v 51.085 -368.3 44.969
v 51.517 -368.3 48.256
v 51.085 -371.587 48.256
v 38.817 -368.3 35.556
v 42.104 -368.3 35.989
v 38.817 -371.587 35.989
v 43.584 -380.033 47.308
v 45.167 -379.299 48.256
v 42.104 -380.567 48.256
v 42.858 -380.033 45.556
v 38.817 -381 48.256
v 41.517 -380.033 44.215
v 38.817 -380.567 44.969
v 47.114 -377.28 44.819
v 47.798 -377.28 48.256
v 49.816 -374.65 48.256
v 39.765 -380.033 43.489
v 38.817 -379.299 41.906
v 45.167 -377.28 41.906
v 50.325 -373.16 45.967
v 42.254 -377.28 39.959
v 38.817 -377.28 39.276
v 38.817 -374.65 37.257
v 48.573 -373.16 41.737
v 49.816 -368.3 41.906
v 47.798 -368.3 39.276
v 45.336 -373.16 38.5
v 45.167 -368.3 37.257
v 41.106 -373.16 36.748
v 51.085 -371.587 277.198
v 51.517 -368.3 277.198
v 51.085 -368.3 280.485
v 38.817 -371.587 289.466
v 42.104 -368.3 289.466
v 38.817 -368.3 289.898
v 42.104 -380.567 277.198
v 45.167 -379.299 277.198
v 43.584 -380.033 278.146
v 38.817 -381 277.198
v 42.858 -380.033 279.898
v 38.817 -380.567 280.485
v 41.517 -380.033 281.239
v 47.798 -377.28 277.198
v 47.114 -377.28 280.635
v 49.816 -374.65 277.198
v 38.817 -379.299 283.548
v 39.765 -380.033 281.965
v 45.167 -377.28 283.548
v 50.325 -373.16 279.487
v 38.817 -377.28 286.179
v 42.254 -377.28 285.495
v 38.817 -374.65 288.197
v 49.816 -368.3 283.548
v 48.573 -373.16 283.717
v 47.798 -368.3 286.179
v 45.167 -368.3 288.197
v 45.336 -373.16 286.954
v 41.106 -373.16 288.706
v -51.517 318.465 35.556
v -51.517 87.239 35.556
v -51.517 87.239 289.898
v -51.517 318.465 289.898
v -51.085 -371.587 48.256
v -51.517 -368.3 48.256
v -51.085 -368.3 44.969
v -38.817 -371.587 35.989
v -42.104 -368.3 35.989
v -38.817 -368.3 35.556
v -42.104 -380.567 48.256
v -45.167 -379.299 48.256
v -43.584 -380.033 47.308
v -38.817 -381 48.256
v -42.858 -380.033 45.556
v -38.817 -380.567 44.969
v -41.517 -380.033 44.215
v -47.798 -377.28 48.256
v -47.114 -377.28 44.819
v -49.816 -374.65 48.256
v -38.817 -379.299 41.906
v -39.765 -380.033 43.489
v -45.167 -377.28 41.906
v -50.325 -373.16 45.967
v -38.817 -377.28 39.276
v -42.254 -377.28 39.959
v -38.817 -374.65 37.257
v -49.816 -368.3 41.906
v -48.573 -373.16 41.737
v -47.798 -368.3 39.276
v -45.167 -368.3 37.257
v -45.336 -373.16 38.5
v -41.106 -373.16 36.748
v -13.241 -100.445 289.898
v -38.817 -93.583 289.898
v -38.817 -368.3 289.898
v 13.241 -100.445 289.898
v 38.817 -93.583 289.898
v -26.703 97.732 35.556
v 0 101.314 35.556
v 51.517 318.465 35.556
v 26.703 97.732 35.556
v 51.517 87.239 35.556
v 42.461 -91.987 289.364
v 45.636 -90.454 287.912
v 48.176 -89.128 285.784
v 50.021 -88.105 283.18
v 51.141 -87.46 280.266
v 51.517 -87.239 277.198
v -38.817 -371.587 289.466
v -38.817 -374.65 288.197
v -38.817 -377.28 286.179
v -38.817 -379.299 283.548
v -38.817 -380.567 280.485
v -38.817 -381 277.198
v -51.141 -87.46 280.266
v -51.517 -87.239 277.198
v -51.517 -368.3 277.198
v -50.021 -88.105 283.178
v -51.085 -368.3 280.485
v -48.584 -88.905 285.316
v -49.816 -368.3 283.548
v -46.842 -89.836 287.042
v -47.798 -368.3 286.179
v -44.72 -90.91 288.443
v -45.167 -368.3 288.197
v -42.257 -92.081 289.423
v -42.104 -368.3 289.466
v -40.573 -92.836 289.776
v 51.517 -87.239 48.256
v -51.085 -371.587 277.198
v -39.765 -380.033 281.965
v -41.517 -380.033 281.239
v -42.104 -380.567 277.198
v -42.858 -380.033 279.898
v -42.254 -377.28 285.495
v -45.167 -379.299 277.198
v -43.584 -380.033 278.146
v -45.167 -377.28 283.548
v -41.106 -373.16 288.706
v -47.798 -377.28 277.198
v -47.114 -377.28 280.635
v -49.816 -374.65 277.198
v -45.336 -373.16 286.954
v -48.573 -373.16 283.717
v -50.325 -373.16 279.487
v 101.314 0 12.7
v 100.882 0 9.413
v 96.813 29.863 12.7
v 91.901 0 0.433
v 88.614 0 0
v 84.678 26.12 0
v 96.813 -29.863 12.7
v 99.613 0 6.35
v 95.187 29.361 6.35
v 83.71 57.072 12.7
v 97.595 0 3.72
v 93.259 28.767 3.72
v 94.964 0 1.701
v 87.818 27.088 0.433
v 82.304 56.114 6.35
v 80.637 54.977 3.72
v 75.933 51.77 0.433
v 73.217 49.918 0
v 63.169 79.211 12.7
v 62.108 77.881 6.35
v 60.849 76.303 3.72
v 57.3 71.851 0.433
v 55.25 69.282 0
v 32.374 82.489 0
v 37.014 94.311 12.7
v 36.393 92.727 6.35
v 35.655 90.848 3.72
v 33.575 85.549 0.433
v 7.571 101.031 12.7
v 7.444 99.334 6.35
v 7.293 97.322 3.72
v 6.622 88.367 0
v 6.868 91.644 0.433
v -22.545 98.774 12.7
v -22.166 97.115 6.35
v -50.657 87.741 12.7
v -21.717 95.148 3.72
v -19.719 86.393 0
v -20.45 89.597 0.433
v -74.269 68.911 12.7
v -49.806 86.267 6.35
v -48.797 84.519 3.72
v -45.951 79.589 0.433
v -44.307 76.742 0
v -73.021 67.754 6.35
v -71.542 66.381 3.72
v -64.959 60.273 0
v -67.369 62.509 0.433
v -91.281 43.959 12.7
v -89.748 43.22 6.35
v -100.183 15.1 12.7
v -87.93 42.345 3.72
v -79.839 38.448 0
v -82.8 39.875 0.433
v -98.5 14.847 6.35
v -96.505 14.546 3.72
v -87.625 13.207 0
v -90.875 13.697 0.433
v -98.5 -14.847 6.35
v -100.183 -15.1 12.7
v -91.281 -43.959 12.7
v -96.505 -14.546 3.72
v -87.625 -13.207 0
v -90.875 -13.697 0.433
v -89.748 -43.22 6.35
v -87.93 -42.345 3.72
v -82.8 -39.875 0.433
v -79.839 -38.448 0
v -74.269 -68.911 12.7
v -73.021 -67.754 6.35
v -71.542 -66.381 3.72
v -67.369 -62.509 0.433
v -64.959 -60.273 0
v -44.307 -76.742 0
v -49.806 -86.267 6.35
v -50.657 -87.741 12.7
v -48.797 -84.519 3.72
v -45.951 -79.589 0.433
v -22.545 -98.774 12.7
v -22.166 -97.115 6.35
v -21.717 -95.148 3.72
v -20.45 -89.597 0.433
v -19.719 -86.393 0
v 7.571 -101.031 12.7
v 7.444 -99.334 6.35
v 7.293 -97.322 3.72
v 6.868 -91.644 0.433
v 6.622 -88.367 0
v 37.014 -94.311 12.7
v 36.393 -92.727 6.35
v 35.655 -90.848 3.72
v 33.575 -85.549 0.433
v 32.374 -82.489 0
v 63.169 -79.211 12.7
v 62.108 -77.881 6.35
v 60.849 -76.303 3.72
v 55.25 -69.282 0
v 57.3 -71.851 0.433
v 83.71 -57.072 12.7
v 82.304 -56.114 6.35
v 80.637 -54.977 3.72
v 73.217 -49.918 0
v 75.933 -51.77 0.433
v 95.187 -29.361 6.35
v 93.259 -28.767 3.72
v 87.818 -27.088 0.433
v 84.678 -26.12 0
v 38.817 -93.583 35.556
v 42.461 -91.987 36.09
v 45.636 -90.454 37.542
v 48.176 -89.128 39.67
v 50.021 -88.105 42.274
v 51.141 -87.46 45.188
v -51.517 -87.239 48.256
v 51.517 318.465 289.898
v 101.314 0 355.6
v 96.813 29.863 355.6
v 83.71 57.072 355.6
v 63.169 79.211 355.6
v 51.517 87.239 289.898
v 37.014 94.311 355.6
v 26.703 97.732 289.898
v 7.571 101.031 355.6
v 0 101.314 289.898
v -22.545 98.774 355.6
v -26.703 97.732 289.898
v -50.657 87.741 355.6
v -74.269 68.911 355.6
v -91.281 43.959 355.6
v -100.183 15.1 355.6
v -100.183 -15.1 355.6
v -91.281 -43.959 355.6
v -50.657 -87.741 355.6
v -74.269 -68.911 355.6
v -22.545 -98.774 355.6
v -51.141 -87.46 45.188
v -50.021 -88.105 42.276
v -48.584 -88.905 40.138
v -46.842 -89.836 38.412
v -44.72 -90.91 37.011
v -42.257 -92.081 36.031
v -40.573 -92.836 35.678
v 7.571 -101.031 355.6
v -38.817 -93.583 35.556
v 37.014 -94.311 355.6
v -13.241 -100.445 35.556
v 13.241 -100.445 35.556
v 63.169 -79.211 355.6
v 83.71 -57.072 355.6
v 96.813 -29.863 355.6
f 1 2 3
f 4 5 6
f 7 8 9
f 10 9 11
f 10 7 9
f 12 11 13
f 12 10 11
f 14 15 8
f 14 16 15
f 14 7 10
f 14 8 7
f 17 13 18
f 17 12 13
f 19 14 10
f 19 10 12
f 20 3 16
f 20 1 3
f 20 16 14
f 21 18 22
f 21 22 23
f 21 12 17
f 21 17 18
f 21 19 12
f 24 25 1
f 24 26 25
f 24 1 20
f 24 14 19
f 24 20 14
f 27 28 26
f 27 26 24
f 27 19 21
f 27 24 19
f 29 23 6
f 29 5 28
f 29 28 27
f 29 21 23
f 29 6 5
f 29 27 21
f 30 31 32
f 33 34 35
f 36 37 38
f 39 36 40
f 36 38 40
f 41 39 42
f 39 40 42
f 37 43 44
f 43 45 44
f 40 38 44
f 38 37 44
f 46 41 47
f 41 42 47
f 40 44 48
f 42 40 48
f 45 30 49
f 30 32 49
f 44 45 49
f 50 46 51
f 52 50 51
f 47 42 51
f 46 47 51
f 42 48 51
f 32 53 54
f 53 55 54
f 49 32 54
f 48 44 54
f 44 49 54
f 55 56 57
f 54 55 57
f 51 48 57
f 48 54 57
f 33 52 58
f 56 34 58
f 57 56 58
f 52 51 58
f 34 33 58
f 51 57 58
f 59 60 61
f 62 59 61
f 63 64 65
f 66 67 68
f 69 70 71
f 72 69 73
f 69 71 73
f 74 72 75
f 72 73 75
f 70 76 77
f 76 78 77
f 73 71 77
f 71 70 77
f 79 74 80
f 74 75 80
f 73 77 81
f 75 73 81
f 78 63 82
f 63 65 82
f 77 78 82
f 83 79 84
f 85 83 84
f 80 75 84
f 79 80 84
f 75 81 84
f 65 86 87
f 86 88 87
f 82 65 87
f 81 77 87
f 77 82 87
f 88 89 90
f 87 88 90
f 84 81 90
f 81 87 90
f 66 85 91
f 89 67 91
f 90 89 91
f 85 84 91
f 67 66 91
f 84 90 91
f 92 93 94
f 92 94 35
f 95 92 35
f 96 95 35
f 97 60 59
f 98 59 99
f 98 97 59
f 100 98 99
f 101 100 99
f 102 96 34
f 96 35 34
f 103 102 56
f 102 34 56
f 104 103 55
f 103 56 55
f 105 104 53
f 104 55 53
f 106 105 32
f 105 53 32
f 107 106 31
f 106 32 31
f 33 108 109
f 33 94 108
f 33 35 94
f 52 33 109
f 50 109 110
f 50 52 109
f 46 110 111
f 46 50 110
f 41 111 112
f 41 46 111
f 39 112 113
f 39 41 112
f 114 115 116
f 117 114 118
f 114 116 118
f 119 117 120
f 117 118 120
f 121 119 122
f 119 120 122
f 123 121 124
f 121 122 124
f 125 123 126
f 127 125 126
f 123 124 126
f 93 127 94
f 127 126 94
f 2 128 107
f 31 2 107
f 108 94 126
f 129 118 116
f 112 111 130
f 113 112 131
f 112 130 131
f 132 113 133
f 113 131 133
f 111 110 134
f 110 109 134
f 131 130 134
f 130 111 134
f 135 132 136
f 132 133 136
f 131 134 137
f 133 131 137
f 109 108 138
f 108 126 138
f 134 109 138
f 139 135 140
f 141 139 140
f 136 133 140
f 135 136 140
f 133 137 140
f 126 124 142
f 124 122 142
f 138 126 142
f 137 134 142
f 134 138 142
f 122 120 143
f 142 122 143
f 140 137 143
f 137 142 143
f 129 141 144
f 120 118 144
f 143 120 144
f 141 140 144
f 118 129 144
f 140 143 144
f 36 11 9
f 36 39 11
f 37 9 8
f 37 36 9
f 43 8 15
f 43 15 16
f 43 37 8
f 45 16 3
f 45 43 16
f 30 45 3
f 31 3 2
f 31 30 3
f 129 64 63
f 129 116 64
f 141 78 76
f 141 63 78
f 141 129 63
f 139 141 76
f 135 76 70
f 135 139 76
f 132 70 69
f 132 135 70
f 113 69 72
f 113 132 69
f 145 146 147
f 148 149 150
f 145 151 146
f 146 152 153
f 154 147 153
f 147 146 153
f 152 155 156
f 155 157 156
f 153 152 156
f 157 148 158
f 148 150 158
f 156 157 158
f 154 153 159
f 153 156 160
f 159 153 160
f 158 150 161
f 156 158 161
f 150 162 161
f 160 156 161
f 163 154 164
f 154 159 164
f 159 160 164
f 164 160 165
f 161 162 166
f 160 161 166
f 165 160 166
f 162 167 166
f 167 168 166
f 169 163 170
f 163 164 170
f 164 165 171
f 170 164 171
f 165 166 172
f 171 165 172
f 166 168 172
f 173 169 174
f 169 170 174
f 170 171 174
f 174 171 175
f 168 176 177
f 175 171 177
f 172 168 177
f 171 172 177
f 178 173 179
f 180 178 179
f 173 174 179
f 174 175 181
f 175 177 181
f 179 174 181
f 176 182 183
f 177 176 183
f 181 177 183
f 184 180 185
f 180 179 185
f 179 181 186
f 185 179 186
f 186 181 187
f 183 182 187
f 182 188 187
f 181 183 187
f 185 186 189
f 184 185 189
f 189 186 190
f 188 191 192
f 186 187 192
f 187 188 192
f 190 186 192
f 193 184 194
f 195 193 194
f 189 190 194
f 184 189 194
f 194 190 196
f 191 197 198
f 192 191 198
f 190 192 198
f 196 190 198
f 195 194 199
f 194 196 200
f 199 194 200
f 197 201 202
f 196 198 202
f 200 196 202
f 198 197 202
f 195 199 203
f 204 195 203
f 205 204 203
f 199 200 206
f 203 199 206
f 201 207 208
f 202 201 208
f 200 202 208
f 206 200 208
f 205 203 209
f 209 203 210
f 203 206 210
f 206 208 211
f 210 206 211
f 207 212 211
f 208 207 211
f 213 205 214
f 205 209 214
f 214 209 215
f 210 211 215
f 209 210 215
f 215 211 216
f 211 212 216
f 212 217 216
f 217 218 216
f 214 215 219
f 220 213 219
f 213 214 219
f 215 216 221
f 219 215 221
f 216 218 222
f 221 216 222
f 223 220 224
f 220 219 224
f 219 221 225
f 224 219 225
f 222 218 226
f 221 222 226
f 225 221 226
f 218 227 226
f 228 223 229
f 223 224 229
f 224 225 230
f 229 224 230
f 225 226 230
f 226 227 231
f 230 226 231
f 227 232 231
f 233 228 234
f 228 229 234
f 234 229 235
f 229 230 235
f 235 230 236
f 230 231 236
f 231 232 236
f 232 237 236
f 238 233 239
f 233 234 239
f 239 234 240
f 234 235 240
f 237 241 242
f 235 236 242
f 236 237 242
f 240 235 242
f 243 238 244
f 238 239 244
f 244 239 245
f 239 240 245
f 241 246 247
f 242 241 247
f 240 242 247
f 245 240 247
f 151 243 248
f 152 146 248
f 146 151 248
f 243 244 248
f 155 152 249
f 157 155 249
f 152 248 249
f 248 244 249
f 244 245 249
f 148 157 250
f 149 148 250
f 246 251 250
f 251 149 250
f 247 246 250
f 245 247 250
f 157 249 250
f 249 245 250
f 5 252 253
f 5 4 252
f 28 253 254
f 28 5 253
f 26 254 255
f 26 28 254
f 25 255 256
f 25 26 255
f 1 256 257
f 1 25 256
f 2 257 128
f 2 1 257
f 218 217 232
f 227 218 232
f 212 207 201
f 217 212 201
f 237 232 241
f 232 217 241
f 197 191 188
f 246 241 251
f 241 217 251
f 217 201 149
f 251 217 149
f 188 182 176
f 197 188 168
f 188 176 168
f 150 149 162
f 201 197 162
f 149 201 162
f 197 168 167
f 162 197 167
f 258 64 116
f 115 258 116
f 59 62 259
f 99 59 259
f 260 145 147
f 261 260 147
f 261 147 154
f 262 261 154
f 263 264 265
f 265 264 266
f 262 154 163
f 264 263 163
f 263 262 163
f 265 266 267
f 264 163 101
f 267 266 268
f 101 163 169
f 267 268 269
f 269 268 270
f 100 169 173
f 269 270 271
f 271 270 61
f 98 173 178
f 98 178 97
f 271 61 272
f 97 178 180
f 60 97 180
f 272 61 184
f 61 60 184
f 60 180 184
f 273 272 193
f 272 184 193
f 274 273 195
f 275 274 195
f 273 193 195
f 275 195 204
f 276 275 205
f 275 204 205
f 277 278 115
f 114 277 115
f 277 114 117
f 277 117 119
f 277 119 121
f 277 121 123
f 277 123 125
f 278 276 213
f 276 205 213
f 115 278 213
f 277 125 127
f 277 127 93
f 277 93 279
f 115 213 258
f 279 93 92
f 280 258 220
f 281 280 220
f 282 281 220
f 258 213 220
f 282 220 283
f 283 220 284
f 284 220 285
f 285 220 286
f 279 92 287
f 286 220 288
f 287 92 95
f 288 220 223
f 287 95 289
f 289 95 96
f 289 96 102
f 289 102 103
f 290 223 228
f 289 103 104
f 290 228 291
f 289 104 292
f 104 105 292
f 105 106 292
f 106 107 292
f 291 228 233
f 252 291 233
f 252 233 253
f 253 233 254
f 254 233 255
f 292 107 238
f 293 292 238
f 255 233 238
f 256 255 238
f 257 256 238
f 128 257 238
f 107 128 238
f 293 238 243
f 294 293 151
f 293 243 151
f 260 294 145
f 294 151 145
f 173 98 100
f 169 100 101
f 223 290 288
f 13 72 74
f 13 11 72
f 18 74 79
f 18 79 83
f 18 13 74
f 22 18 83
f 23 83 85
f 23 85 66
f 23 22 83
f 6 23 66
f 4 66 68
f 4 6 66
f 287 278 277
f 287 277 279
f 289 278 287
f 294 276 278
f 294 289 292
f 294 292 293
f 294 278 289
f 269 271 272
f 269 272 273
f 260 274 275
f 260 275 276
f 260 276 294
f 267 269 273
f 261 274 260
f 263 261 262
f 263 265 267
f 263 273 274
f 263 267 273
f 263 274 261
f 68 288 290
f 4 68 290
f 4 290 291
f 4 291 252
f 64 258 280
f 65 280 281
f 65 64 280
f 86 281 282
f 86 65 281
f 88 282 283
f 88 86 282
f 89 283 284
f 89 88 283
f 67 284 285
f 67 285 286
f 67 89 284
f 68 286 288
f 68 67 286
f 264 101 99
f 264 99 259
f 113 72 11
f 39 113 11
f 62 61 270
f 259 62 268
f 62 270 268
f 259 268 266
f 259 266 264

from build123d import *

# Parameters (mm, degrees)
F0_R     = 101.314415
F1_DEPTH = 355.6
F2_W     = 103.034616
F2_H     = 254.342378
F3_DEPTH = 318.465123
F4_DEPTH = 381
F5_R     = 12.7


with BuildPart() as f1:
    # F0 (on Top) → F1 (new body)
    with BuildSketch(Plane.XY):
        Circle(F0_R)
    extrude(amount=F1_DEPTH)

    # F2 (on Front) → F3 (join)
    with BuildSketch(Plane.XZ):
        with Locations((0, 162.727058)):
            Rectangle(F2_W, F2_H)
    extrude(amount=-F3_DEPTH)

    # F2 (on Front) → F4 (join)
    with BuildSketch(Plane.XZ):
        with Locations((0, 162.727058)):
            Rectangle(F2_W, F2_H)
    extrude(amount=F4_DEPTH)

    # F5
    f5_edges = [f1.edges().sort_by_distance(p)[0] for p in [
        (-101.314415, 0, 0),
        (51.517308, -234.119313, 35.555869),
        (51.517308, -234.119313, 289.898247),
        (51.517308, -381, 162.727058),
        (-51.517308, -234.119313, 35.555869),
        (-51.517308, -234.119313, 289.898247),
        (0, -381, 289.898247),
        (-51.517308, -381, 162.727058),
        (0, -381, 35.555869),
    ]]
    fillet(f5_edges, radius=F5_R)


solid = f1.part
